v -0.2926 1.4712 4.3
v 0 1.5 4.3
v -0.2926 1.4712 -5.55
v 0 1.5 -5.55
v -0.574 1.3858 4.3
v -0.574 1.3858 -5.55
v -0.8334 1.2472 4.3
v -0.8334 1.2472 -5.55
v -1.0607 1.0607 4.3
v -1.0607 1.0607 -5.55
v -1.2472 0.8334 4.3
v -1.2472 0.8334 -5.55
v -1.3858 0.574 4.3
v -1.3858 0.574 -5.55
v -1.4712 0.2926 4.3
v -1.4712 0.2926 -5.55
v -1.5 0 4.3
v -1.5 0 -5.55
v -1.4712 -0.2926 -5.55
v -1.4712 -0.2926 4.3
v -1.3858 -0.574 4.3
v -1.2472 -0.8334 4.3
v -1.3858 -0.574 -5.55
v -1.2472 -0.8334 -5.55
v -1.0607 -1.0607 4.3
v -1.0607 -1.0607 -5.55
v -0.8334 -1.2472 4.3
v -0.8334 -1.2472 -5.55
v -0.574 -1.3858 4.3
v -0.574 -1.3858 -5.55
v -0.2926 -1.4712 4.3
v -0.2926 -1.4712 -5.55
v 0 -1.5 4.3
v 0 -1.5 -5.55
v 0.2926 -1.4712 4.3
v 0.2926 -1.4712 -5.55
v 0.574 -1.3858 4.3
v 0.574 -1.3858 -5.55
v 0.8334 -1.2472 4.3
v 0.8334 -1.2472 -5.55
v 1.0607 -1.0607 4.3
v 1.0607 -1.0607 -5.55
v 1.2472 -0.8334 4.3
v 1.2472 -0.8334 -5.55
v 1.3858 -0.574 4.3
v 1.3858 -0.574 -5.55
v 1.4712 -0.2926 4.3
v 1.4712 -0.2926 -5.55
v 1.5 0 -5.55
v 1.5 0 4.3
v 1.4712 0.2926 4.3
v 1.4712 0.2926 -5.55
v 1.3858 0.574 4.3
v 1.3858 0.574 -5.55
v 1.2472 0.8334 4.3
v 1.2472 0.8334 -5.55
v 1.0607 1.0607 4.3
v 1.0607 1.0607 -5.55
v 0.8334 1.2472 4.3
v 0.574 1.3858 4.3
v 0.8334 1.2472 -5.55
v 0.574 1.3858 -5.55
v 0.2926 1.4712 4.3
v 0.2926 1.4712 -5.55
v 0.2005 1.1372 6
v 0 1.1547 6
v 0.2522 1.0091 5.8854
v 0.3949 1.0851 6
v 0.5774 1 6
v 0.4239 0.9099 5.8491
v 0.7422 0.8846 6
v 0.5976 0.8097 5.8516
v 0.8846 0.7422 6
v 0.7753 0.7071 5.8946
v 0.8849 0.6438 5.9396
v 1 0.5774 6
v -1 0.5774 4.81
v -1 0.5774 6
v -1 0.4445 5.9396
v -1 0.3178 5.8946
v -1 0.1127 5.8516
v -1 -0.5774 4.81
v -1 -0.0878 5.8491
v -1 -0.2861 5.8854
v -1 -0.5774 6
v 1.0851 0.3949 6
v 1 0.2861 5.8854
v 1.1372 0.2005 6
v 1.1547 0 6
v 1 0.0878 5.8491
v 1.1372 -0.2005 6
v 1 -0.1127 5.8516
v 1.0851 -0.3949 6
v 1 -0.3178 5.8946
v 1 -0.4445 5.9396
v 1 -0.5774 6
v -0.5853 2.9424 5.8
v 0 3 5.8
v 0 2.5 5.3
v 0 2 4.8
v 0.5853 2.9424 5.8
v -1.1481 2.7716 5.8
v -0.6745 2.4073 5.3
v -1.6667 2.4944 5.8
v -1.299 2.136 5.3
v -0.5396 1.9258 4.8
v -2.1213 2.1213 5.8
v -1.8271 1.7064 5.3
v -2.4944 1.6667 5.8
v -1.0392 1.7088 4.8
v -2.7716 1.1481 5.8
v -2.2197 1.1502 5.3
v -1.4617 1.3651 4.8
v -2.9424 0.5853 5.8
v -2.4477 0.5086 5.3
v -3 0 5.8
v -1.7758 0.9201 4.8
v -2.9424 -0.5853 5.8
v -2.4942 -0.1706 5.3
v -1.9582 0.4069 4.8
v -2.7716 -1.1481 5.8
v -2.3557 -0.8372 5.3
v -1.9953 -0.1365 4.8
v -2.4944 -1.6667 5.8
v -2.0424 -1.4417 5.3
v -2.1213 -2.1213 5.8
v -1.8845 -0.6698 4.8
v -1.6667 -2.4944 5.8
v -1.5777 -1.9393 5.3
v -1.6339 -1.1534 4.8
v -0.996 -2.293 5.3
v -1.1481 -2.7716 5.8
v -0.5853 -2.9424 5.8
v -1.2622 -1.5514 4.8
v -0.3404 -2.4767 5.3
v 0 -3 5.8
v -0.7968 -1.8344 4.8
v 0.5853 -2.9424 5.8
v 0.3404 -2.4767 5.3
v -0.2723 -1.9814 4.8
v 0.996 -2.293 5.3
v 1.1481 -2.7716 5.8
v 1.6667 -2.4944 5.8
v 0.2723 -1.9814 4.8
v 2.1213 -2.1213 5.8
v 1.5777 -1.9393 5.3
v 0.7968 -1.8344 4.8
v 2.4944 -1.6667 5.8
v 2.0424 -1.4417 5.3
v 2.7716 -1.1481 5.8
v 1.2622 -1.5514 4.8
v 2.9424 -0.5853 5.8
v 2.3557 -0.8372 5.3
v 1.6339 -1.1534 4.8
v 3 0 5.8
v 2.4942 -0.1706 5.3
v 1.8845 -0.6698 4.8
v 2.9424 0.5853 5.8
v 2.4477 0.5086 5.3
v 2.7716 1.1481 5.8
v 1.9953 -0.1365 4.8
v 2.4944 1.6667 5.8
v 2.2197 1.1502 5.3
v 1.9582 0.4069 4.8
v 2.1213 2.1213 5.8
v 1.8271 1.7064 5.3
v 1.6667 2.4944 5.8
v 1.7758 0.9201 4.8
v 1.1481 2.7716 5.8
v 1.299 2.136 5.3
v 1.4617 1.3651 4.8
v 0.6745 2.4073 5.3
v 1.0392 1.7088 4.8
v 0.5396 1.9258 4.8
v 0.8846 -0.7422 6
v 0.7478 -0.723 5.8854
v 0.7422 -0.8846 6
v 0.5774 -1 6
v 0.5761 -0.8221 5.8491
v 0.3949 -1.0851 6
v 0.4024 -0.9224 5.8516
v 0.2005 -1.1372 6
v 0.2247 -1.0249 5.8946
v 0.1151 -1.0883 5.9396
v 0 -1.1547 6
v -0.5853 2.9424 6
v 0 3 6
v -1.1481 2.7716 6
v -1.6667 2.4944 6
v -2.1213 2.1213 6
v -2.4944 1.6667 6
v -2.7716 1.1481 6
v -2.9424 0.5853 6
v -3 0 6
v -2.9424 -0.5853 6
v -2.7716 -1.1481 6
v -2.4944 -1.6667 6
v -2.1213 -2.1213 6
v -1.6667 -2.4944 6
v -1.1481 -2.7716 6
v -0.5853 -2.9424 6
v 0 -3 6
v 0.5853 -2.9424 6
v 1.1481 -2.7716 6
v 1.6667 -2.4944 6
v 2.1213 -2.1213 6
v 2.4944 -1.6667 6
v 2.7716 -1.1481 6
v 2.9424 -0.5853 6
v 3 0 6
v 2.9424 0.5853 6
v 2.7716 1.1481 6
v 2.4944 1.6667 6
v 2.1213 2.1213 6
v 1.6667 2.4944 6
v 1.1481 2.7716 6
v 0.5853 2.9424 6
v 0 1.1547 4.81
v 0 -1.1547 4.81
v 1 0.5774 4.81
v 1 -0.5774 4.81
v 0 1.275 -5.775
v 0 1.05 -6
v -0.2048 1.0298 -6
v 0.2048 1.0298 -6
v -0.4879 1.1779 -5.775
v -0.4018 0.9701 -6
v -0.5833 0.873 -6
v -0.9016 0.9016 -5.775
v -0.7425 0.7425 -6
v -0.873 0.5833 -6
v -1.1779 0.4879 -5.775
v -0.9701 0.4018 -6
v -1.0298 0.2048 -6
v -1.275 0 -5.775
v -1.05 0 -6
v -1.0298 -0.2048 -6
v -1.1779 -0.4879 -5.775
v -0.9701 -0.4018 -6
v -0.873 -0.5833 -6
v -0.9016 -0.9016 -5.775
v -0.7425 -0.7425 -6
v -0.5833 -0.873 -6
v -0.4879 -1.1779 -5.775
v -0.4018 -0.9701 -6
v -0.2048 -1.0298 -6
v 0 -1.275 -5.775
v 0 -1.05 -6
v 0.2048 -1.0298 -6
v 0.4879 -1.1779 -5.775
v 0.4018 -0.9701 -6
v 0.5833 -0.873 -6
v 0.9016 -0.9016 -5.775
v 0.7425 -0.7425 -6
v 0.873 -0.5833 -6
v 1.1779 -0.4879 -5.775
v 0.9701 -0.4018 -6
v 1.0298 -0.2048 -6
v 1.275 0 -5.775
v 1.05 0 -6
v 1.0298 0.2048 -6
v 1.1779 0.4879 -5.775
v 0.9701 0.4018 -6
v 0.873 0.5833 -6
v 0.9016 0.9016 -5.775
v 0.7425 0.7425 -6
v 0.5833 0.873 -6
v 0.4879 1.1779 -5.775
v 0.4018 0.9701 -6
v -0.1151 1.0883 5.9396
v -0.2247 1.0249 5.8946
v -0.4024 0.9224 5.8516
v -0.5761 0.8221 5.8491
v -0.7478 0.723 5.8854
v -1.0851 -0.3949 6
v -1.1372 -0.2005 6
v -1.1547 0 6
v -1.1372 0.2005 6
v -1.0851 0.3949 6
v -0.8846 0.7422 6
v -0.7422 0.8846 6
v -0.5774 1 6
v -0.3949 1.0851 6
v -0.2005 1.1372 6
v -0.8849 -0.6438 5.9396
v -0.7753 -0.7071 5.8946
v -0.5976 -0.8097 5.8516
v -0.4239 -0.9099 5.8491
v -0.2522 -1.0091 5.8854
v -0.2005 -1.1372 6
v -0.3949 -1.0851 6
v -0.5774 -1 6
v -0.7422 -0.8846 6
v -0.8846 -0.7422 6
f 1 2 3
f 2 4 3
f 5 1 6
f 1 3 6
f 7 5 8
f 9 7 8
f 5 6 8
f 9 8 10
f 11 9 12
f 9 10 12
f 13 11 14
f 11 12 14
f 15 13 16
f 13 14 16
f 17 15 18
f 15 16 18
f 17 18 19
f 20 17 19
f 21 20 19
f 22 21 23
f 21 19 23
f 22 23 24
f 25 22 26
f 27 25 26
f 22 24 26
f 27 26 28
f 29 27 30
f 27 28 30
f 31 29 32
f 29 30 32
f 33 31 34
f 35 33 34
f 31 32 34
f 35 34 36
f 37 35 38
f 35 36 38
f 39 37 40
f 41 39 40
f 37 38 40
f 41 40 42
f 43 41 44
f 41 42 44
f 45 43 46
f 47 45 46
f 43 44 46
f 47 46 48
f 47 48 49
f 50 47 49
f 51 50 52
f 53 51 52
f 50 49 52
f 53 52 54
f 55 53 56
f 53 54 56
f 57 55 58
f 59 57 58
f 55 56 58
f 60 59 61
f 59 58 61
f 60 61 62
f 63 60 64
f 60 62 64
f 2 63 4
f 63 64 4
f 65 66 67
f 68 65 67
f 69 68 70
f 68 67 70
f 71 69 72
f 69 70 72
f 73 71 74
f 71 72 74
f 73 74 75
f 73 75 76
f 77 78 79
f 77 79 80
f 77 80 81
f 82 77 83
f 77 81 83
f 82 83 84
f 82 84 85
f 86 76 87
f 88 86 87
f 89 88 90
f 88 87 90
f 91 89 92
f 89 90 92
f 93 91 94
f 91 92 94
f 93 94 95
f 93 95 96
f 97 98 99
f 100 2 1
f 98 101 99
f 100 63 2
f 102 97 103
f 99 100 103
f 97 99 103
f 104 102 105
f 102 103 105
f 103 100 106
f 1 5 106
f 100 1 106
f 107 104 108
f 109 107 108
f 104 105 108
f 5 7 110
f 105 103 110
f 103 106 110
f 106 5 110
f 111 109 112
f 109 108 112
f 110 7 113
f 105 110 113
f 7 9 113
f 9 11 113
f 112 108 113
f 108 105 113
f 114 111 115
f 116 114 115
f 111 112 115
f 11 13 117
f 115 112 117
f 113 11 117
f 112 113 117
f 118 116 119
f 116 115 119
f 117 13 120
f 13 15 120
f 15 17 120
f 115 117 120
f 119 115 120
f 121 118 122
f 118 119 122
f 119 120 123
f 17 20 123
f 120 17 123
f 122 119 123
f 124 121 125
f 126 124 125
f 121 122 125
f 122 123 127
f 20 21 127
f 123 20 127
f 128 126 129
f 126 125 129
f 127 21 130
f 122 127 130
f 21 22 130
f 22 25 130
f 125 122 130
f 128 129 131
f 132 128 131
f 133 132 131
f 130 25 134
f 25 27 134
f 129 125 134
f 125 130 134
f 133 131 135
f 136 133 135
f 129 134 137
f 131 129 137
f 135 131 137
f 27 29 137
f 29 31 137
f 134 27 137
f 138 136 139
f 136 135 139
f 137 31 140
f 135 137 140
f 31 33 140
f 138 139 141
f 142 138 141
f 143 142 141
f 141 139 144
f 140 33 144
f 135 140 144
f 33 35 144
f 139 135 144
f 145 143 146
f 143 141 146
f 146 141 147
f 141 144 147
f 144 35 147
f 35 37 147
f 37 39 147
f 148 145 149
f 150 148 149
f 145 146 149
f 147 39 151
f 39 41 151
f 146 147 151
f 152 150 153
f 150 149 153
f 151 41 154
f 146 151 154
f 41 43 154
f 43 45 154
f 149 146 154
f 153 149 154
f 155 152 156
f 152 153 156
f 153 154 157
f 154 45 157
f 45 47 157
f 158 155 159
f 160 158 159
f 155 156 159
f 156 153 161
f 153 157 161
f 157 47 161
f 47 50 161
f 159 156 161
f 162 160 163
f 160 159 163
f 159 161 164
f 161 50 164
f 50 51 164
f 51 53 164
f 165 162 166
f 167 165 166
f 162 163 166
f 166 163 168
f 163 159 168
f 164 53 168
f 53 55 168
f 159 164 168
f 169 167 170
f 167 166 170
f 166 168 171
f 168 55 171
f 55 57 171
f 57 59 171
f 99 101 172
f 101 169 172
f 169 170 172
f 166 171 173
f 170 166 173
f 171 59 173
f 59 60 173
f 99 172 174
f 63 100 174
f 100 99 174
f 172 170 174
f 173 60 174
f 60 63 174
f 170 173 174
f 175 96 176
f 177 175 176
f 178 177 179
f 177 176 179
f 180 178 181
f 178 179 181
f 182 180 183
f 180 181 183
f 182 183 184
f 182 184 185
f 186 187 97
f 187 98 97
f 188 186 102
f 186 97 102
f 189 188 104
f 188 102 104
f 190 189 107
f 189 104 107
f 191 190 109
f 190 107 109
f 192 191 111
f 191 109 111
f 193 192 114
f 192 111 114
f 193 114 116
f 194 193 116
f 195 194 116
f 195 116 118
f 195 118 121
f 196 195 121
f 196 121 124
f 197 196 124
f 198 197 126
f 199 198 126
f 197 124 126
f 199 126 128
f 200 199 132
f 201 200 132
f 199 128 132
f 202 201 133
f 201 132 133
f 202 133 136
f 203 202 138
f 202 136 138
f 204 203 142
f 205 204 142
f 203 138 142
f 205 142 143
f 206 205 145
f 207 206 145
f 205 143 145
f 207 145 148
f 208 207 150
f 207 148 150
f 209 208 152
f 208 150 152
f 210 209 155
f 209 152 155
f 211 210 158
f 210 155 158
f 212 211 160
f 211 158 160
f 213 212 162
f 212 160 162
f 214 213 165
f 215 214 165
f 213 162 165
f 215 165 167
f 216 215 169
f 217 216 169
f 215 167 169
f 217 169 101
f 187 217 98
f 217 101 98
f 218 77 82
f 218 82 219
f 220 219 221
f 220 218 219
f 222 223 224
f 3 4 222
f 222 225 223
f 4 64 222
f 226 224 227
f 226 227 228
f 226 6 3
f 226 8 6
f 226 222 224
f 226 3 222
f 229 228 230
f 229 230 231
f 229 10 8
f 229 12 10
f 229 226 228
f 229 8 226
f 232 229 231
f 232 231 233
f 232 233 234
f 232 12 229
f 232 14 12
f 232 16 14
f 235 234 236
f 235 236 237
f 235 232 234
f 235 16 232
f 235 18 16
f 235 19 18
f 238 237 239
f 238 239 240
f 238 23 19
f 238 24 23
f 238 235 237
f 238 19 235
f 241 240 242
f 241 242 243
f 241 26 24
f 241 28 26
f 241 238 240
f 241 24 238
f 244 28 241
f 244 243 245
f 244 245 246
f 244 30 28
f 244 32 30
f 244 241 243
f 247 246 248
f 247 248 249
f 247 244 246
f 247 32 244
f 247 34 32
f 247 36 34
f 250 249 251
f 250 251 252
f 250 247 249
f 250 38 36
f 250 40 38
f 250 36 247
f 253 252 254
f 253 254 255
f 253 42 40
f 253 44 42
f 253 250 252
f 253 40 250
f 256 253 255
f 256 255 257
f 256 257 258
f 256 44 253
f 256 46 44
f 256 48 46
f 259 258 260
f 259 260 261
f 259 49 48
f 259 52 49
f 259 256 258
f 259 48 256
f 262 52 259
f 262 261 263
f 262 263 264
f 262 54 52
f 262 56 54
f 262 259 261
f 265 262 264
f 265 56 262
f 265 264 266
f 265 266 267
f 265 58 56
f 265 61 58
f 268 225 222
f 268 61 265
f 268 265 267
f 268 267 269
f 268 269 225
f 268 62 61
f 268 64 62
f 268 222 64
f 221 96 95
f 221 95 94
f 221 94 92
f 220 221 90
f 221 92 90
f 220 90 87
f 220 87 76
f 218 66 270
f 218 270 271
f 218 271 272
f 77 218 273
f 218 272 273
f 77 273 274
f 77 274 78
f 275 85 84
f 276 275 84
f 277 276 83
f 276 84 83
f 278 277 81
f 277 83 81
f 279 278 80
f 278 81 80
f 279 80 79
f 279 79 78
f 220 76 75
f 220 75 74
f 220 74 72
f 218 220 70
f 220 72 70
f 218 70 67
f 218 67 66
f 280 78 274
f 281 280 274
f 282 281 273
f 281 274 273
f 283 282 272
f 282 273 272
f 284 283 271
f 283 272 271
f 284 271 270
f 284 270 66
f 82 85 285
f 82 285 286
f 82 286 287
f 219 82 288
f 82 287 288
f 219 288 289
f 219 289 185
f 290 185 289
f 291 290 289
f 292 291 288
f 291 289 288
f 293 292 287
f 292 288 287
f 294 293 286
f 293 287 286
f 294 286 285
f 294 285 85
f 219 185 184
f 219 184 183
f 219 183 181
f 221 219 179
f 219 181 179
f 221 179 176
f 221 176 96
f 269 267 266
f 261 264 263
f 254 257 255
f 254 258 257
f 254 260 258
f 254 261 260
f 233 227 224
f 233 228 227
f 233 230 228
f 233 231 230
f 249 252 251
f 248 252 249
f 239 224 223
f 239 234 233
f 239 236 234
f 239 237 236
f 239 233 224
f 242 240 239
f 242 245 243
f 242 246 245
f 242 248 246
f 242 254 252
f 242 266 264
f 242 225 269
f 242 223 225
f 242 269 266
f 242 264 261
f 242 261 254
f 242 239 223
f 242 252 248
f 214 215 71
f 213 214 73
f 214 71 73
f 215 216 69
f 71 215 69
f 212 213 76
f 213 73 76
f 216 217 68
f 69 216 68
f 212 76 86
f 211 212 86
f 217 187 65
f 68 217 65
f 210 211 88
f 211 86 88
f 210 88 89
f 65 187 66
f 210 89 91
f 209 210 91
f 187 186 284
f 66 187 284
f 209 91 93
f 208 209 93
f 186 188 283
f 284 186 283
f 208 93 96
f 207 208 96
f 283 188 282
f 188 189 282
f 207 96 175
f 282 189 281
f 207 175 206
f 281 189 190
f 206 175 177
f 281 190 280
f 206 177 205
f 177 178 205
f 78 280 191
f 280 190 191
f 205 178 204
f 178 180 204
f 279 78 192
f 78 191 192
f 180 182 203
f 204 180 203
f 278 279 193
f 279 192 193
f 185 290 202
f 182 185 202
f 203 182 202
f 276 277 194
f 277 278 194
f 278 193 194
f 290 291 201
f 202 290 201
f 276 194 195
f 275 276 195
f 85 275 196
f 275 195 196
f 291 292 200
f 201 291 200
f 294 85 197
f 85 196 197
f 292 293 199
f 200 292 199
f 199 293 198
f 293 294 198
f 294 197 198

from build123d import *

# Parameters (mm, degrees)
SKETCH3_W          = 12
SKETCH3_H          = 1.5
CHAMFER1_SIZE      = 0.45
CUT_EXTRUDE1_DEPTH = 1.19


with BuildPart() as part:
    # Sketch3 → Revolve1 (revolve)
    with BuildSketch(Plane(origin=(0, 0, 0), x_dir=(0, 0, -1), z_dir=(1, 0, 0))):
        with Locations((0, 0.75)):
            Rectangle(SKETCH3_W, SKETCH3_H)
    revolve(axis=Axis((0, 0, -6), (0, 0, 1)))

    # Chamfer1
    chamfer1_edges = [part.edges().sort_by_distance(p)[0] for p in [
        (0, -1.5, -6),
    ]]
    chamfer(chamfer1_edges, length=CHAMFER1_SIZE)

    # Sketch6 → Revolve2 (revolve)
    with BuildSketch(Plane(origin=(0, 0, 0), x_dir=(0, 0, -1), z_dir=(1, 0, 0))):
        Polygon((-6, 3), (-5.8, 3), (-4.3, 1.5), (-4.3, 0), (-6, 0), align=None)
    revolve(axis=Axis((0, 0, -6), (0, 0, 1)))

    # Sketch8 → Cut-Extrude1 (cut)
    with BuildSketch(Plane.XY.offset(6)):
        Polygon((0, 1.154700538), (-1, 0.577350269), (-1, -0.577350269), (0, -1.154700538), (1, -0.577350269), (1, 0.577350269), align=None)
    extrude(amount=-CUT_EXTRUDE1_DEPTH, mode=Mode.SUBTRACT)

    # Cut-Extrude2 cone 1 section (through the dimple's axis) → Cut-Extrude2 (revolve, cut)
    with BuildSketch(Plane(origin=(0, 0, 6), x_dir=(0, -1, 0), z_dir=(1, 0, 0))):
        Polygon((0, 0), (1.154700538, 0), (0, 1.154700538), align=None)
    revolve(axis=Axis((0, 0, 6), (0, 0, -1)), mode=Mode.SUBTRACT)


solid = part.part
